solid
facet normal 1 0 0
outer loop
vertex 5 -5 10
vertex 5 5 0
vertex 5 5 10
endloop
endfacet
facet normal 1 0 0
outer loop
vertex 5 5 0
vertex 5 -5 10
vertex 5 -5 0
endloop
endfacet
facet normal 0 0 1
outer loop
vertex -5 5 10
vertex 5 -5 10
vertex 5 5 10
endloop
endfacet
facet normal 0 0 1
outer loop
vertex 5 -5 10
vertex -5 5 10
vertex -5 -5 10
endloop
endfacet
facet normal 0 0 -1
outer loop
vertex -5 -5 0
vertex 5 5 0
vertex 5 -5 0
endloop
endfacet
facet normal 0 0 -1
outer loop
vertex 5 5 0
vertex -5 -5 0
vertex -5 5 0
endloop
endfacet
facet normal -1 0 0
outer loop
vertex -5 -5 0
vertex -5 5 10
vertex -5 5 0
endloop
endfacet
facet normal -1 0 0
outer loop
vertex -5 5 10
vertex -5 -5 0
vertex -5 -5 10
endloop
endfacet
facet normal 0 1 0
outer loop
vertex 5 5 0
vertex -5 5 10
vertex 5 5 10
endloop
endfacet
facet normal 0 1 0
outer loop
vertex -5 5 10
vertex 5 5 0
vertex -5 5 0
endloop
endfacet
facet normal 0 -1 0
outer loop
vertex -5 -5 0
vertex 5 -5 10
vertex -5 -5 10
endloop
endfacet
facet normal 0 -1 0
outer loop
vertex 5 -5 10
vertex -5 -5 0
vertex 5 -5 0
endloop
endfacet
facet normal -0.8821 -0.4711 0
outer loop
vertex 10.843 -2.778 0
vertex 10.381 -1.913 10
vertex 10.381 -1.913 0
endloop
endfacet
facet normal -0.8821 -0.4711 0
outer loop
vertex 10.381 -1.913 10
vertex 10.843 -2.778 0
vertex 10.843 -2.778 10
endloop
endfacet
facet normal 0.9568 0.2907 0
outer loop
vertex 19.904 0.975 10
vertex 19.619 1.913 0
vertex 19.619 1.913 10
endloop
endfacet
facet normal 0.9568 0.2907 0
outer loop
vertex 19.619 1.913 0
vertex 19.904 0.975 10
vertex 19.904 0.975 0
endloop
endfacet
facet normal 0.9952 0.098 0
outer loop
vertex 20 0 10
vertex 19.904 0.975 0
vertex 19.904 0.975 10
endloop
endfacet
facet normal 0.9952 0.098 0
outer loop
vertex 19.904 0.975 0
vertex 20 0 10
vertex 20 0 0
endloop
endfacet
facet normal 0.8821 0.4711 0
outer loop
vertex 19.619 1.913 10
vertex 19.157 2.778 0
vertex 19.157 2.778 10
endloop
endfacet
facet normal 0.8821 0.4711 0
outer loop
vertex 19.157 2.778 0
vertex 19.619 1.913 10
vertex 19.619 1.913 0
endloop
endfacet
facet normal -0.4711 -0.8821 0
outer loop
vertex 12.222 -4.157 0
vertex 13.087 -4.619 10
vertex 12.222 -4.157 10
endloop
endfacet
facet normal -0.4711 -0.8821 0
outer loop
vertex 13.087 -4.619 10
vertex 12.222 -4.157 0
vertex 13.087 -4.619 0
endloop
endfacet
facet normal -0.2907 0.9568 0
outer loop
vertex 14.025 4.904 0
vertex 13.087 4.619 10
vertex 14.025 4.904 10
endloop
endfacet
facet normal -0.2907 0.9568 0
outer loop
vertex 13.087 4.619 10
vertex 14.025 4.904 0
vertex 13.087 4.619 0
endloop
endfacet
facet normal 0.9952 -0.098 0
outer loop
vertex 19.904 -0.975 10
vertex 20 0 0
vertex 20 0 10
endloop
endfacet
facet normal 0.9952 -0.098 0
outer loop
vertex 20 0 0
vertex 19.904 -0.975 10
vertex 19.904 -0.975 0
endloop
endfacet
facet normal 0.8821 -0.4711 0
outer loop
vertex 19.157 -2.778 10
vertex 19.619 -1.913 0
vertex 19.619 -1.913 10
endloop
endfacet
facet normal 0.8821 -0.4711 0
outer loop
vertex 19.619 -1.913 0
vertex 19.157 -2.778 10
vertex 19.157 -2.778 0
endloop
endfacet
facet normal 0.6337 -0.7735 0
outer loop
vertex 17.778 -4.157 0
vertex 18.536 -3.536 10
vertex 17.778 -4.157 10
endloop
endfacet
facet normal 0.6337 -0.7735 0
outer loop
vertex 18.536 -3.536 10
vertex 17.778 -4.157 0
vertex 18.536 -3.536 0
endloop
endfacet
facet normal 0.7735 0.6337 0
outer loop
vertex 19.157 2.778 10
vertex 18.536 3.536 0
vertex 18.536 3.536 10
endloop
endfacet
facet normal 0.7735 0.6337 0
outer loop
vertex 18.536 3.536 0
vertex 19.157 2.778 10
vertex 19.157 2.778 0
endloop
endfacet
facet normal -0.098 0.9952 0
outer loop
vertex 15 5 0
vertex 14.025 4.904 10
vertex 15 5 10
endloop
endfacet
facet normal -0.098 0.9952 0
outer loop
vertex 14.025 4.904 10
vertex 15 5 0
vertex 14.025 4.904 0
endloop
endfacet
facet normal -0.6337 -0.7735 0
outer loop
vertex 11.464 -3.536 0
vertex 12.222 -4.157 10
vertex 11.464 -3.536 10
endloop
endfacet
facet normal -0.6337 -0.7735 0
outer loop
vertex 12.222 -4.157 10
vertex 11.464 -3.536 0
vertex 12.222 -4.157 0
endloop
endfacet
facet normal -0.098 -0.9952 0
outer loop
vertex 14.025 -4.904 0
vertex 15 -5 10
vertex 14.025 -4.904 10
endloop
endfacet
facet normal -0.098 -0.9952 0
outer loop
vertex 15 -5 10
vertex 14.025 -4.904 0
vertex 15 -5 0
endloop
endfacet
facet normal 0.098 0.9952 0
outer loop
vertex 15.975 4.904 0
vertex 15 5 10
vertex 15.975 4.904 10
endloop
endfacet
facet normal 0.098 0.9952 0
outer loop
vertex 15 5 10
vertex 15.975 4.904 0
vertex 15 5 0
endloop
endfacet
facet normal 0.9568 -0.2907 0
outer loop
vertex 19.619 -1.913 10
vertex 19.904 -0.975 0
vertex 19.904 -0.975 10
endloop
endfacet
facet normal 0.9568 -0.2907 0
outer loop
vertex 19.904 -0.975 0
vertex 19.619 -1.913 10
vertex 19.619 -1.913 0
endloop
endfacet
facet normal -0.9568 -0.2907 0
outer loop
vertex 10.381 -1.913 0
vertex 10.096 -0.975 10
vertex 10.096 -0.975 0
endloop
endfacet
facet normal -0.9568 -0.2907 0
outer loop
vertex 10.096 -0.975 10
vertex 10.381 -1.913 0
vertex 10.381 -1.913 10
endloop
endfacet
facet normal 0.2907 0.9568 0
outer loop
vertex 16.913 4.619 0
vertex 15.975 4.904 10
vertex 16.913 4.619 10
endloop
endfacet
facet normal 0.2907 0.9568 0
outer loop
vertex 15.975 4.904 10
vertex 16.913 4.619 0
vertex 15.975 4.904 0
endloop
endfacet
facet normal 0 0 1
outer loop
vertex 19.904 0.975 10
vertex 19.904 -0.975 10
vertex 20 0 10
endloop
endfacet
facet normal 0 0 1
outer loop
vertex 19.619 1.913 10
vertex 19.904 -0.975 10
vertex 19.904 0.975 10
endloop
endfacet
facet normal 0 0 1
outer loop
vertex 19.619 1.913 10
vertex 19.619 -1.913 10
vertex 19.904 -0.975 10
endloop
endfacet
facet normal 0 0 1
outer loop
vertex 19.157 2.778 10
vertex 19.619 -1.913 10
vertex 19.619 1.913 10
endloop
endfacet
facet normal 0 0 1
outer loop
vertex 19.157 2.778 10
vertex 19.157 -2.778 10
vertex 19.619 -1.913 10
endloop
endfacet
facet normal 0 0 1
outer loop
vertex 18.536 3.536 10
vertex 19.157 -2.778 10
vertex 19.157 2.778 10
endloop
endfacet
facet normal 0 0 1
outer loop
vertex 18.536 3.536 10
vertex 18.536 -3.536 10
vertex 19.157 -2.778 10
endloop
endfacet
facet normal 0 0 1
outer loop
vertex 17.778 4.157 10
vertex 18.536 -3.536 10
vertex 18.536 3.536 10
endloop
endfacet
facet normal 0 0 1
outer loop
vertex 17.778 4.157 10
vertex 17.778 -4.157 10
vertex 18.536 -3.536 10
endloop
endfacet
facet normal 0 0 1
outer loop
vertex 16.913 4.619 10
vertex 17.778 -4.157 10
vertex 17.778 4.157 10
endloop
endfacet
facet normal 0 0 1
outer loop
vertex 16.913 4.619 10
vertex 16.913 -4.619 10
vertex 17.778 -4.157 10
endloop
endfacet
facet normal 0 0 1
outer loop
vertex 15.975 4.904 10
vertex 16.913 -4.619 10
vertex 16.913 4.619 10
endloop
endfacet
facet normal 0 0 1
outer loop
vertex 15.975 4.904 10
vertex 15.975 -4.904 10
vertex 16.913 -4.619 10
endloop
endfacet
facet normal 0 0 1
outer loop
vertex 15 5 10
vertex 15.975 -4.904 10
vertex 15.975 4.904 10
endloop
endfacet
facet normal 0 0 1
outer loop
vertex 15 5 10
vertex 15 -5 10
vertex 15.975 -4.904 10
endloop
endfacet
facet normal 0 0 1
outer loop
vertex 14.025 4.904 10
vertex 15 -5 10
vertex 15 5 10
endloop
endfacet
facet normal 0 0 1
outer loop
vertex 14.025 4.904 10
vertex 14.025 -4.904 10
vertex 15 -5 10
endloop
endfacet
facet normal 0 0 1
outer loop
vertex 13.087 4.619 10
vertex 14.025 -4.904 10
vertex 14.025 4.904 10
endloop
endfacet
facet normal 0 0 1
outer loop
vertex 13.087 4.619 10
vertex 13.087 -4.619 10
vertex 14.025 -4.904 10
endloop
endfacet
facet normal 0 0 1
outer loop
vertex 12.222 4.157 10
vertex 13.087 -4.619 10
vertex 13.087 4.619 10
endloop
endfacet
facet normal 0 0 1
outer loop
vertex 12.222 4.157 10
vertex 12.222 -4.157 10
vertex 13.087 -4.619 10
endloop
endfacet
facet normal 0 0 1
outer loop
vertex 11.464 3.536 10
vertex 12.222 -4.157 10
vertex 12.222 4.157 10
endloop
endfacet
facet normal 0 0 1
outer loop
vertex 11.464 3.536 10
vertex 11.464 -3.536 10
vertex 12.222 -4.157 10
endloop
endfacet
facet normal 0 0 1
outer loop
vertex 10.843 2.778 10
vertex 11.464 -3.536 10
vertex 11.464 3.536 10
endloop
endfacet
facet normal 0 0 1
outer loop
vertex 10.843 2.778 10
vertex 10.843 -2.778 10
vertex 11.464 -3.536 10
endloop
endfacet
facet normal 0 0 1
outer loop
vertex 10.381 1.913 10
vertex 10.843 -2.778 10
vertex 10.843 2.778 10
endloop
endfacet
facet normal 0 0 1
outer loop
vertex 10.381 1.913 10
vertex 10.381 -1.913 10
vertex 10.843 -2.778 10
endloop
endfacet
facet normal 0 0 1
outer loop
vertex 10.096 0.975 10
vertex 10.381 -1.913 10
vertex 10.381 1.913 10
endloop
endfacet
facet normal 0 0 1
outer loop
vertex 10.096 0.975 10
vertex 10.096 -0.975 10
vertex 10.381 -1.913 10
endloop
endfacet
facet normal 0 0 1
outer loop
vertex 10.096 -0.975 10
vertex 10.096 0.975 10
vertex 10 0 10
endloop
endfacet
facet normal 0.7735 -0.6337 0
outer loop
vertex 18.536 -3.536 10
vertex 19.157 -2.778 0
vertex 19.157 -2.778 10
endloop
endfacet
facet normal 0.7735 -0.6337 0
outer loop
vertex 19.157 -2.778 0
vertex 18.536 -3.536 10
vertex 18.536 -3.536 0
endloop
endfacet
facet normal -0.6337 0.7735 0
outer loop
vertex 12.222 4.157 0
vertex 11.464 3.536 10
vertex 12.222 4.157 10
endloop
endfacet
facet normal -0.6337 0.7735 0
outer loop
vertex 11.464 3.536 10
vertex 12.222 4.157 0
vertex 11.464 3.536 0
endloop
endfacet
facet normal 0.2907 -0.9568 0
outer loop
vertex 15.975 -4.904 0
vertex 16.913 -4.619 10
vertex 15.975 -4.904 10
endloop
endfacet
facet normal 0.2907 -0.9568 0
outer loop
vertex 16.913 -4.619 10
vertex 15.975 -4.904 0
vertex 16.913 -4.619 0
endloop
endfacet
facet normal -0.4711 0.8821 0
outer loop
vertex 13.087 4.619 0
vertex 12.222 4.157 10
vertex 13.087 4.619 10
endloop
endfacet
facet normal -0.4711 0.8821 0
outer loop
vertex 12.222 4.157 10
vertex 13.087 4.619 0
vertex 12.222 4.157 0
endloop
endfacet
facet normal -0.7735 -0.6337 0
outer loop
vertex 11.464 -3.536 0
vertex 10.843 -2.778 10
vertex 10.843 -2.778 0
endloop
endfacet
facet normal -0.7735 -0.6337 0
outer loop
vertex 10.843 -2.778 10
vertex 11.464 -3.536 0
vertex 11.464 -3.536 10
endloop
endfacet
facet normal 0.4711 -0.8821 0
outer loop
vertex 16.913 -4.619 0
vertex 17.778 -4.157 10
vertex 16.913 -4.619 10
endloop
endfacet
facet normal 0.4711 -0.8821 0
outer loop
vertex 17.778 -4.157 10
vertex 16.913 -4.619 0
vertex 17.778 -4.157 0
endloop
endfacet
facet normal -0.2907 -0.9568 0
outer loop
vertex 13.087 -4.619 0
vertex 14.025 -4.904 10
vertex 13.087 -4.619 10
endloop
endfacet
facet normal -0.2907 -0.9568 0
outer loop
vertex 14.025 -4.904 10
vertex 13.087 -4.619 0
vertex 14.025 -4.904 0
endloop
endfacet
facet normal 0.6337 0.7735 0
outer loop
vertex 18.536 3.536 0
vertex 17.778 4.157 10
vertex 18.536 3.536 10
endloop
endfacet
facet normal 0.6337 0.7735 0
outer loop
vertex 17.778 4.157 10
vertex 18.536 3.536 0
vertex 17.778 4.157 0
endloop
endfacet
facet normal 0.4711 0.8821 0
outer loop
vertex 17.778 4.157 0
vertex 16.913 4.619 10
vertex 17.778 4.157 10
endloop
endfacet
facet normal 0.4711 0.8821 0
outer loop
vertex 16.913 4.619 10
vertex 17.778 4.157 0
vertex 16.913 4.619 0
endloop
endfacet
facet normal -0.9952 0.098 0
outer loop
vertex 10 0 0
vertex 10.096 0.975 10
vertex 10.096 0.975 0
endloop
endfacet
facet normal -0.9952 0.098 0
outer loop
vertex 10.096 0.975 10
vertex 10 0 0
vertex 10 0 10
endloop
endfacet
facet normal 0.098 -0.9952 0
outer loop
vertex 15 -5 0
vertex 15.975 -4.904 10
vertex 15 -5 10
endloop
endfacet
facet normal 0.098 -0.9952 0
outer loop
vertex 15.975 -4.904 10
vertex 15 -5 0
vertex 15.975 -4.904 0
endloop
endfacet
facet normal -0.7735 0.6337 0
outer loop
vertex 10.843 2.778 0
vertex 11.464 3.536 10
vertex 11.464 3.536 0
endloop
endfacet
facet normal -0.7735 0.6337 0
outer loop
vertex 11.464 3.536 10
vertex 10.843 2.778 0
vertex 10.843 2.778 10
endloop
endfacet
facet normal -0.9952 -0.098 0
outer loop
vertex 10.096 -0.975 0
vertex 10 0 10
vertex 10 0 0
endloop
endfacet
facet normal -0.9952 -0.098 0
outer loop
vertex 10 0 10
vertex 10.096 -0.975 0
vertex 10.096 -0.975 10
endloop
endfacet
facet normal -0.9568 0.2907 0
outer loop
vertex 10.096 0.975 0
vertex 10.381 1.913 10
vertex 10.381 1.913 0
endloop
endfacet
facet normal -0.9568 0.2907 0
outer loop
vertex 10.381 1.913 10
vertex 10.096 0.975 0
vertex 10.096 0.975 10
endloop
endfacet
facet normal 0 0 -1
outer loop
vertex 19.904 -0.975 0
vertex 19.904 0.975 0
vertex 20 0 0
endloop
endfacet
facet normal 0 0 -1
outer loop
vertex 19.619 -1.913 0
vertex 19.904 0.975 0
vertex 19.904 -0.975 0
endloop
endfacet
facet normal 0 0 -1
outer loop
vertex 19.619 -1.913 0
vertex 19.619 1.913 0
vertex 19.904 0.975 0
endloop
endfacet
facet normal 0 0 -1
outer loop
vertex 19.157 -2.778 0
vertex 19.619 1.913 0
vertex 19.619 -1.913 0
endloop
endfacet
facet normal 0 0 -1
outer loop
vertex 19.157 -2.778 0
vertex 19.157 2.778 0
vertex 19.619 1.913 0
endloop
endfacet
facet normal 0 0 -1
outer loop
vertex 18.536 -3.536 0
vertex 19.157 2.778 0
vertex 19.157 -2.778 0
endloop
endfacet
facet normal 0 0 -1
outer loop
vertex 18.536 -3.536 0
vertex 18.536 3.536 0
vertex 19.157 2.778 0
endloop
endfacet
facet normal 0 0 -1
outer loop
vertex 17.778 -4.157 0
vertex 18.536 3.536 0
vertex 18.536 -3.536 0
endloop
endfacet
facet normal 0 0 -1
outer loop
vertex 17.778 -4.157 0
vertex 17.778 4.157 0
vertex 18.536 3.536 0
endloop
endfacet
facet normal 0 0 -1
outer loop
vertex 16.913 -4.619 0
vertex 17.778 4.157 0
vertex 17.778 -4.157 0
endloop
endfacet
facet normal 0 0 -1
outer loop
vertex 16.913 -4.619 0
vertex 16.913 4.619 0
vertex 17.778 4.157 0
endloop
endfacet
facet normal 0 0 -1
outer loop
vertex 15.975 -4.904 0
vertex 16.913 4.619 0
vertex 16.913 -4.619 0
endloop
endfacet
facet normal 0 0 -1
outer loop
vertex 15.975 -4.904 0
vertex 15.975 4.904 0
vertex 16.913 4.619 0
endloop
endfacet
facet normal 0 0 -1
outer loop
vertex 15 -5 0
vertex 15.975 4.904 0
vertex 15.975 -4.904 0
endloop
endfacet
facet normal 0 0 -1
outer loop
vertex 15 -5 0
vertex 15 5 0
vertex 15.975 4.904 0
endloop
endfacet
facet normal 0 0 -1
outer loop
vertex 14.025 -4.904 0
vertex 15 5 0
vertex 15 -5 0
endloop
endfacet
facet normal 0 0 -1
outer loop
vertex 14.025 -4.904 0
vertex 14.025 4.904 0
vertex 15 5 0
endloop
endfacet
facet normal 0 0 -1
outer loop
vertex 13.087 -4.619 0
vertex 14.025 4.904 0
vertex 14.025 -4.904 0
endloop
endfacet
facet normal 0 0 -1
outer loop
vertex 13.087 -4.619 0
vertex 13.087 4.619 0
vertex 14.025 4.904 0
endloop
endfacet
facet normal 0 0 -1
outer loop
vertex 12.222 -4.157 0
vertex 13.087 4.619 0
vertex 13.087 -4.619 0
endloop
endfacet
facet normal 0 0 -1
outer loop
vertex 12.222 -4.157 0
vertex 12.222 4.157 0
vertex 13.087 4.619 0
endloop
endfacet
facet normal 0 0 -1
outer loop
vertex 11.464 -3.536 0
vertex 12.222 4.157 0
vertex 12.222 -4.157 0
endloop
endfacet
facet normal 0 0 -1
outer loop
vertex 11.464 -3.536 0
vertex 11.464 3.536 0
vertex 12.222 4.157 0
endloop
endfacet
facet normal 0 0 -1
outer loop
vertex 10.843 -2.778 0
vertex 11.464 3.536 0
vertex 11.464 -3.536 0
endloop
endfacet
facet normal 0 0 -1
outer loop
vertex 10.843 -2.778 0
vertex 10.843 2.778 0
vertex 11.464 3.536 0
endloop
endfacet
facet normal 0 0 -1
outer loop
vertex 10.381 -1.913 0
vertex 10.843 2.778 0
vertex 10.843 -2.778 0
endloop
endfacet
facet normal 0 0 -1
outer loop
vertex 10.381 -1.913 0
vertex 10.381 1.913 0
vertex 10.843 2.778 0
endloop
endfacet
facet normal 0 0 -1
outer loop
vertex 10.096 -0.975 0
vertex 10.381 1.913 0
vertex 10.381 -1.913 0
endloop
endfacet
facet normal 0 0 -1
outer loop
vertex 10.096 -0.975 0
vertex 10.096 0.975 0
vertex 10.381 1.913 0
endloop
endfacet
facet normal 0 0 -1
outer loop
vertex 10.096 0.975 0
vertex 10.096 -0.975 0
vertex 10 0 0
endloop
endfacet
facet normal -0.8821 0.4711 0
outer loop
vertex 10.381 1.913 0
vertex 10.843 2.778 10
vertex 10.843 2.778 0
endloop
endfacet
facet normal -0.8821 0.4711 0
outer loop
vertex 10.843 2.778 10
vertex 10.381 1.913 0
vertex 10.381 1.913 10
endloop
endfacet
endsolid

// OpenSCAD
// The xy_ variants of shape modules are centered with respect to the X/Y axes and "sit" on te XY plane.

$fn=32;

module xy_cube(width, depth, height) {
    translate([0, 0, height / 2])
    cube([width, depth, height], center=true);
}

module xy_cylinder(
    h,
    r, r1, r2,
    d, d1, d2)
{
    translate([0, 0, h / 2])
    cylinder(h=h, r=r, r1=r1, r2=r2, d=d, d1=d1, d2=d2, center=true);
}

module rounded_square(width, length, radius) {
    diameter = radius * 2;
    
    minkowski() {
        square([width - diameter, length - diameter], center=true);
        circle(radius);
    }
}

// Spreads out its children, spacing them along the x/y/z axis by the given amount.
module spread(x, y, z) {
    for(i = [0 : $children -1 ]) {
        translate([i*x, i*y, i*z])
        children(i);
    }
}

spread(15, 0, 0) {
    xy_cube(10, 10, 10);
    xy_cylinder(10, d=10);
    rounded_square(5, 10, 1);
}
